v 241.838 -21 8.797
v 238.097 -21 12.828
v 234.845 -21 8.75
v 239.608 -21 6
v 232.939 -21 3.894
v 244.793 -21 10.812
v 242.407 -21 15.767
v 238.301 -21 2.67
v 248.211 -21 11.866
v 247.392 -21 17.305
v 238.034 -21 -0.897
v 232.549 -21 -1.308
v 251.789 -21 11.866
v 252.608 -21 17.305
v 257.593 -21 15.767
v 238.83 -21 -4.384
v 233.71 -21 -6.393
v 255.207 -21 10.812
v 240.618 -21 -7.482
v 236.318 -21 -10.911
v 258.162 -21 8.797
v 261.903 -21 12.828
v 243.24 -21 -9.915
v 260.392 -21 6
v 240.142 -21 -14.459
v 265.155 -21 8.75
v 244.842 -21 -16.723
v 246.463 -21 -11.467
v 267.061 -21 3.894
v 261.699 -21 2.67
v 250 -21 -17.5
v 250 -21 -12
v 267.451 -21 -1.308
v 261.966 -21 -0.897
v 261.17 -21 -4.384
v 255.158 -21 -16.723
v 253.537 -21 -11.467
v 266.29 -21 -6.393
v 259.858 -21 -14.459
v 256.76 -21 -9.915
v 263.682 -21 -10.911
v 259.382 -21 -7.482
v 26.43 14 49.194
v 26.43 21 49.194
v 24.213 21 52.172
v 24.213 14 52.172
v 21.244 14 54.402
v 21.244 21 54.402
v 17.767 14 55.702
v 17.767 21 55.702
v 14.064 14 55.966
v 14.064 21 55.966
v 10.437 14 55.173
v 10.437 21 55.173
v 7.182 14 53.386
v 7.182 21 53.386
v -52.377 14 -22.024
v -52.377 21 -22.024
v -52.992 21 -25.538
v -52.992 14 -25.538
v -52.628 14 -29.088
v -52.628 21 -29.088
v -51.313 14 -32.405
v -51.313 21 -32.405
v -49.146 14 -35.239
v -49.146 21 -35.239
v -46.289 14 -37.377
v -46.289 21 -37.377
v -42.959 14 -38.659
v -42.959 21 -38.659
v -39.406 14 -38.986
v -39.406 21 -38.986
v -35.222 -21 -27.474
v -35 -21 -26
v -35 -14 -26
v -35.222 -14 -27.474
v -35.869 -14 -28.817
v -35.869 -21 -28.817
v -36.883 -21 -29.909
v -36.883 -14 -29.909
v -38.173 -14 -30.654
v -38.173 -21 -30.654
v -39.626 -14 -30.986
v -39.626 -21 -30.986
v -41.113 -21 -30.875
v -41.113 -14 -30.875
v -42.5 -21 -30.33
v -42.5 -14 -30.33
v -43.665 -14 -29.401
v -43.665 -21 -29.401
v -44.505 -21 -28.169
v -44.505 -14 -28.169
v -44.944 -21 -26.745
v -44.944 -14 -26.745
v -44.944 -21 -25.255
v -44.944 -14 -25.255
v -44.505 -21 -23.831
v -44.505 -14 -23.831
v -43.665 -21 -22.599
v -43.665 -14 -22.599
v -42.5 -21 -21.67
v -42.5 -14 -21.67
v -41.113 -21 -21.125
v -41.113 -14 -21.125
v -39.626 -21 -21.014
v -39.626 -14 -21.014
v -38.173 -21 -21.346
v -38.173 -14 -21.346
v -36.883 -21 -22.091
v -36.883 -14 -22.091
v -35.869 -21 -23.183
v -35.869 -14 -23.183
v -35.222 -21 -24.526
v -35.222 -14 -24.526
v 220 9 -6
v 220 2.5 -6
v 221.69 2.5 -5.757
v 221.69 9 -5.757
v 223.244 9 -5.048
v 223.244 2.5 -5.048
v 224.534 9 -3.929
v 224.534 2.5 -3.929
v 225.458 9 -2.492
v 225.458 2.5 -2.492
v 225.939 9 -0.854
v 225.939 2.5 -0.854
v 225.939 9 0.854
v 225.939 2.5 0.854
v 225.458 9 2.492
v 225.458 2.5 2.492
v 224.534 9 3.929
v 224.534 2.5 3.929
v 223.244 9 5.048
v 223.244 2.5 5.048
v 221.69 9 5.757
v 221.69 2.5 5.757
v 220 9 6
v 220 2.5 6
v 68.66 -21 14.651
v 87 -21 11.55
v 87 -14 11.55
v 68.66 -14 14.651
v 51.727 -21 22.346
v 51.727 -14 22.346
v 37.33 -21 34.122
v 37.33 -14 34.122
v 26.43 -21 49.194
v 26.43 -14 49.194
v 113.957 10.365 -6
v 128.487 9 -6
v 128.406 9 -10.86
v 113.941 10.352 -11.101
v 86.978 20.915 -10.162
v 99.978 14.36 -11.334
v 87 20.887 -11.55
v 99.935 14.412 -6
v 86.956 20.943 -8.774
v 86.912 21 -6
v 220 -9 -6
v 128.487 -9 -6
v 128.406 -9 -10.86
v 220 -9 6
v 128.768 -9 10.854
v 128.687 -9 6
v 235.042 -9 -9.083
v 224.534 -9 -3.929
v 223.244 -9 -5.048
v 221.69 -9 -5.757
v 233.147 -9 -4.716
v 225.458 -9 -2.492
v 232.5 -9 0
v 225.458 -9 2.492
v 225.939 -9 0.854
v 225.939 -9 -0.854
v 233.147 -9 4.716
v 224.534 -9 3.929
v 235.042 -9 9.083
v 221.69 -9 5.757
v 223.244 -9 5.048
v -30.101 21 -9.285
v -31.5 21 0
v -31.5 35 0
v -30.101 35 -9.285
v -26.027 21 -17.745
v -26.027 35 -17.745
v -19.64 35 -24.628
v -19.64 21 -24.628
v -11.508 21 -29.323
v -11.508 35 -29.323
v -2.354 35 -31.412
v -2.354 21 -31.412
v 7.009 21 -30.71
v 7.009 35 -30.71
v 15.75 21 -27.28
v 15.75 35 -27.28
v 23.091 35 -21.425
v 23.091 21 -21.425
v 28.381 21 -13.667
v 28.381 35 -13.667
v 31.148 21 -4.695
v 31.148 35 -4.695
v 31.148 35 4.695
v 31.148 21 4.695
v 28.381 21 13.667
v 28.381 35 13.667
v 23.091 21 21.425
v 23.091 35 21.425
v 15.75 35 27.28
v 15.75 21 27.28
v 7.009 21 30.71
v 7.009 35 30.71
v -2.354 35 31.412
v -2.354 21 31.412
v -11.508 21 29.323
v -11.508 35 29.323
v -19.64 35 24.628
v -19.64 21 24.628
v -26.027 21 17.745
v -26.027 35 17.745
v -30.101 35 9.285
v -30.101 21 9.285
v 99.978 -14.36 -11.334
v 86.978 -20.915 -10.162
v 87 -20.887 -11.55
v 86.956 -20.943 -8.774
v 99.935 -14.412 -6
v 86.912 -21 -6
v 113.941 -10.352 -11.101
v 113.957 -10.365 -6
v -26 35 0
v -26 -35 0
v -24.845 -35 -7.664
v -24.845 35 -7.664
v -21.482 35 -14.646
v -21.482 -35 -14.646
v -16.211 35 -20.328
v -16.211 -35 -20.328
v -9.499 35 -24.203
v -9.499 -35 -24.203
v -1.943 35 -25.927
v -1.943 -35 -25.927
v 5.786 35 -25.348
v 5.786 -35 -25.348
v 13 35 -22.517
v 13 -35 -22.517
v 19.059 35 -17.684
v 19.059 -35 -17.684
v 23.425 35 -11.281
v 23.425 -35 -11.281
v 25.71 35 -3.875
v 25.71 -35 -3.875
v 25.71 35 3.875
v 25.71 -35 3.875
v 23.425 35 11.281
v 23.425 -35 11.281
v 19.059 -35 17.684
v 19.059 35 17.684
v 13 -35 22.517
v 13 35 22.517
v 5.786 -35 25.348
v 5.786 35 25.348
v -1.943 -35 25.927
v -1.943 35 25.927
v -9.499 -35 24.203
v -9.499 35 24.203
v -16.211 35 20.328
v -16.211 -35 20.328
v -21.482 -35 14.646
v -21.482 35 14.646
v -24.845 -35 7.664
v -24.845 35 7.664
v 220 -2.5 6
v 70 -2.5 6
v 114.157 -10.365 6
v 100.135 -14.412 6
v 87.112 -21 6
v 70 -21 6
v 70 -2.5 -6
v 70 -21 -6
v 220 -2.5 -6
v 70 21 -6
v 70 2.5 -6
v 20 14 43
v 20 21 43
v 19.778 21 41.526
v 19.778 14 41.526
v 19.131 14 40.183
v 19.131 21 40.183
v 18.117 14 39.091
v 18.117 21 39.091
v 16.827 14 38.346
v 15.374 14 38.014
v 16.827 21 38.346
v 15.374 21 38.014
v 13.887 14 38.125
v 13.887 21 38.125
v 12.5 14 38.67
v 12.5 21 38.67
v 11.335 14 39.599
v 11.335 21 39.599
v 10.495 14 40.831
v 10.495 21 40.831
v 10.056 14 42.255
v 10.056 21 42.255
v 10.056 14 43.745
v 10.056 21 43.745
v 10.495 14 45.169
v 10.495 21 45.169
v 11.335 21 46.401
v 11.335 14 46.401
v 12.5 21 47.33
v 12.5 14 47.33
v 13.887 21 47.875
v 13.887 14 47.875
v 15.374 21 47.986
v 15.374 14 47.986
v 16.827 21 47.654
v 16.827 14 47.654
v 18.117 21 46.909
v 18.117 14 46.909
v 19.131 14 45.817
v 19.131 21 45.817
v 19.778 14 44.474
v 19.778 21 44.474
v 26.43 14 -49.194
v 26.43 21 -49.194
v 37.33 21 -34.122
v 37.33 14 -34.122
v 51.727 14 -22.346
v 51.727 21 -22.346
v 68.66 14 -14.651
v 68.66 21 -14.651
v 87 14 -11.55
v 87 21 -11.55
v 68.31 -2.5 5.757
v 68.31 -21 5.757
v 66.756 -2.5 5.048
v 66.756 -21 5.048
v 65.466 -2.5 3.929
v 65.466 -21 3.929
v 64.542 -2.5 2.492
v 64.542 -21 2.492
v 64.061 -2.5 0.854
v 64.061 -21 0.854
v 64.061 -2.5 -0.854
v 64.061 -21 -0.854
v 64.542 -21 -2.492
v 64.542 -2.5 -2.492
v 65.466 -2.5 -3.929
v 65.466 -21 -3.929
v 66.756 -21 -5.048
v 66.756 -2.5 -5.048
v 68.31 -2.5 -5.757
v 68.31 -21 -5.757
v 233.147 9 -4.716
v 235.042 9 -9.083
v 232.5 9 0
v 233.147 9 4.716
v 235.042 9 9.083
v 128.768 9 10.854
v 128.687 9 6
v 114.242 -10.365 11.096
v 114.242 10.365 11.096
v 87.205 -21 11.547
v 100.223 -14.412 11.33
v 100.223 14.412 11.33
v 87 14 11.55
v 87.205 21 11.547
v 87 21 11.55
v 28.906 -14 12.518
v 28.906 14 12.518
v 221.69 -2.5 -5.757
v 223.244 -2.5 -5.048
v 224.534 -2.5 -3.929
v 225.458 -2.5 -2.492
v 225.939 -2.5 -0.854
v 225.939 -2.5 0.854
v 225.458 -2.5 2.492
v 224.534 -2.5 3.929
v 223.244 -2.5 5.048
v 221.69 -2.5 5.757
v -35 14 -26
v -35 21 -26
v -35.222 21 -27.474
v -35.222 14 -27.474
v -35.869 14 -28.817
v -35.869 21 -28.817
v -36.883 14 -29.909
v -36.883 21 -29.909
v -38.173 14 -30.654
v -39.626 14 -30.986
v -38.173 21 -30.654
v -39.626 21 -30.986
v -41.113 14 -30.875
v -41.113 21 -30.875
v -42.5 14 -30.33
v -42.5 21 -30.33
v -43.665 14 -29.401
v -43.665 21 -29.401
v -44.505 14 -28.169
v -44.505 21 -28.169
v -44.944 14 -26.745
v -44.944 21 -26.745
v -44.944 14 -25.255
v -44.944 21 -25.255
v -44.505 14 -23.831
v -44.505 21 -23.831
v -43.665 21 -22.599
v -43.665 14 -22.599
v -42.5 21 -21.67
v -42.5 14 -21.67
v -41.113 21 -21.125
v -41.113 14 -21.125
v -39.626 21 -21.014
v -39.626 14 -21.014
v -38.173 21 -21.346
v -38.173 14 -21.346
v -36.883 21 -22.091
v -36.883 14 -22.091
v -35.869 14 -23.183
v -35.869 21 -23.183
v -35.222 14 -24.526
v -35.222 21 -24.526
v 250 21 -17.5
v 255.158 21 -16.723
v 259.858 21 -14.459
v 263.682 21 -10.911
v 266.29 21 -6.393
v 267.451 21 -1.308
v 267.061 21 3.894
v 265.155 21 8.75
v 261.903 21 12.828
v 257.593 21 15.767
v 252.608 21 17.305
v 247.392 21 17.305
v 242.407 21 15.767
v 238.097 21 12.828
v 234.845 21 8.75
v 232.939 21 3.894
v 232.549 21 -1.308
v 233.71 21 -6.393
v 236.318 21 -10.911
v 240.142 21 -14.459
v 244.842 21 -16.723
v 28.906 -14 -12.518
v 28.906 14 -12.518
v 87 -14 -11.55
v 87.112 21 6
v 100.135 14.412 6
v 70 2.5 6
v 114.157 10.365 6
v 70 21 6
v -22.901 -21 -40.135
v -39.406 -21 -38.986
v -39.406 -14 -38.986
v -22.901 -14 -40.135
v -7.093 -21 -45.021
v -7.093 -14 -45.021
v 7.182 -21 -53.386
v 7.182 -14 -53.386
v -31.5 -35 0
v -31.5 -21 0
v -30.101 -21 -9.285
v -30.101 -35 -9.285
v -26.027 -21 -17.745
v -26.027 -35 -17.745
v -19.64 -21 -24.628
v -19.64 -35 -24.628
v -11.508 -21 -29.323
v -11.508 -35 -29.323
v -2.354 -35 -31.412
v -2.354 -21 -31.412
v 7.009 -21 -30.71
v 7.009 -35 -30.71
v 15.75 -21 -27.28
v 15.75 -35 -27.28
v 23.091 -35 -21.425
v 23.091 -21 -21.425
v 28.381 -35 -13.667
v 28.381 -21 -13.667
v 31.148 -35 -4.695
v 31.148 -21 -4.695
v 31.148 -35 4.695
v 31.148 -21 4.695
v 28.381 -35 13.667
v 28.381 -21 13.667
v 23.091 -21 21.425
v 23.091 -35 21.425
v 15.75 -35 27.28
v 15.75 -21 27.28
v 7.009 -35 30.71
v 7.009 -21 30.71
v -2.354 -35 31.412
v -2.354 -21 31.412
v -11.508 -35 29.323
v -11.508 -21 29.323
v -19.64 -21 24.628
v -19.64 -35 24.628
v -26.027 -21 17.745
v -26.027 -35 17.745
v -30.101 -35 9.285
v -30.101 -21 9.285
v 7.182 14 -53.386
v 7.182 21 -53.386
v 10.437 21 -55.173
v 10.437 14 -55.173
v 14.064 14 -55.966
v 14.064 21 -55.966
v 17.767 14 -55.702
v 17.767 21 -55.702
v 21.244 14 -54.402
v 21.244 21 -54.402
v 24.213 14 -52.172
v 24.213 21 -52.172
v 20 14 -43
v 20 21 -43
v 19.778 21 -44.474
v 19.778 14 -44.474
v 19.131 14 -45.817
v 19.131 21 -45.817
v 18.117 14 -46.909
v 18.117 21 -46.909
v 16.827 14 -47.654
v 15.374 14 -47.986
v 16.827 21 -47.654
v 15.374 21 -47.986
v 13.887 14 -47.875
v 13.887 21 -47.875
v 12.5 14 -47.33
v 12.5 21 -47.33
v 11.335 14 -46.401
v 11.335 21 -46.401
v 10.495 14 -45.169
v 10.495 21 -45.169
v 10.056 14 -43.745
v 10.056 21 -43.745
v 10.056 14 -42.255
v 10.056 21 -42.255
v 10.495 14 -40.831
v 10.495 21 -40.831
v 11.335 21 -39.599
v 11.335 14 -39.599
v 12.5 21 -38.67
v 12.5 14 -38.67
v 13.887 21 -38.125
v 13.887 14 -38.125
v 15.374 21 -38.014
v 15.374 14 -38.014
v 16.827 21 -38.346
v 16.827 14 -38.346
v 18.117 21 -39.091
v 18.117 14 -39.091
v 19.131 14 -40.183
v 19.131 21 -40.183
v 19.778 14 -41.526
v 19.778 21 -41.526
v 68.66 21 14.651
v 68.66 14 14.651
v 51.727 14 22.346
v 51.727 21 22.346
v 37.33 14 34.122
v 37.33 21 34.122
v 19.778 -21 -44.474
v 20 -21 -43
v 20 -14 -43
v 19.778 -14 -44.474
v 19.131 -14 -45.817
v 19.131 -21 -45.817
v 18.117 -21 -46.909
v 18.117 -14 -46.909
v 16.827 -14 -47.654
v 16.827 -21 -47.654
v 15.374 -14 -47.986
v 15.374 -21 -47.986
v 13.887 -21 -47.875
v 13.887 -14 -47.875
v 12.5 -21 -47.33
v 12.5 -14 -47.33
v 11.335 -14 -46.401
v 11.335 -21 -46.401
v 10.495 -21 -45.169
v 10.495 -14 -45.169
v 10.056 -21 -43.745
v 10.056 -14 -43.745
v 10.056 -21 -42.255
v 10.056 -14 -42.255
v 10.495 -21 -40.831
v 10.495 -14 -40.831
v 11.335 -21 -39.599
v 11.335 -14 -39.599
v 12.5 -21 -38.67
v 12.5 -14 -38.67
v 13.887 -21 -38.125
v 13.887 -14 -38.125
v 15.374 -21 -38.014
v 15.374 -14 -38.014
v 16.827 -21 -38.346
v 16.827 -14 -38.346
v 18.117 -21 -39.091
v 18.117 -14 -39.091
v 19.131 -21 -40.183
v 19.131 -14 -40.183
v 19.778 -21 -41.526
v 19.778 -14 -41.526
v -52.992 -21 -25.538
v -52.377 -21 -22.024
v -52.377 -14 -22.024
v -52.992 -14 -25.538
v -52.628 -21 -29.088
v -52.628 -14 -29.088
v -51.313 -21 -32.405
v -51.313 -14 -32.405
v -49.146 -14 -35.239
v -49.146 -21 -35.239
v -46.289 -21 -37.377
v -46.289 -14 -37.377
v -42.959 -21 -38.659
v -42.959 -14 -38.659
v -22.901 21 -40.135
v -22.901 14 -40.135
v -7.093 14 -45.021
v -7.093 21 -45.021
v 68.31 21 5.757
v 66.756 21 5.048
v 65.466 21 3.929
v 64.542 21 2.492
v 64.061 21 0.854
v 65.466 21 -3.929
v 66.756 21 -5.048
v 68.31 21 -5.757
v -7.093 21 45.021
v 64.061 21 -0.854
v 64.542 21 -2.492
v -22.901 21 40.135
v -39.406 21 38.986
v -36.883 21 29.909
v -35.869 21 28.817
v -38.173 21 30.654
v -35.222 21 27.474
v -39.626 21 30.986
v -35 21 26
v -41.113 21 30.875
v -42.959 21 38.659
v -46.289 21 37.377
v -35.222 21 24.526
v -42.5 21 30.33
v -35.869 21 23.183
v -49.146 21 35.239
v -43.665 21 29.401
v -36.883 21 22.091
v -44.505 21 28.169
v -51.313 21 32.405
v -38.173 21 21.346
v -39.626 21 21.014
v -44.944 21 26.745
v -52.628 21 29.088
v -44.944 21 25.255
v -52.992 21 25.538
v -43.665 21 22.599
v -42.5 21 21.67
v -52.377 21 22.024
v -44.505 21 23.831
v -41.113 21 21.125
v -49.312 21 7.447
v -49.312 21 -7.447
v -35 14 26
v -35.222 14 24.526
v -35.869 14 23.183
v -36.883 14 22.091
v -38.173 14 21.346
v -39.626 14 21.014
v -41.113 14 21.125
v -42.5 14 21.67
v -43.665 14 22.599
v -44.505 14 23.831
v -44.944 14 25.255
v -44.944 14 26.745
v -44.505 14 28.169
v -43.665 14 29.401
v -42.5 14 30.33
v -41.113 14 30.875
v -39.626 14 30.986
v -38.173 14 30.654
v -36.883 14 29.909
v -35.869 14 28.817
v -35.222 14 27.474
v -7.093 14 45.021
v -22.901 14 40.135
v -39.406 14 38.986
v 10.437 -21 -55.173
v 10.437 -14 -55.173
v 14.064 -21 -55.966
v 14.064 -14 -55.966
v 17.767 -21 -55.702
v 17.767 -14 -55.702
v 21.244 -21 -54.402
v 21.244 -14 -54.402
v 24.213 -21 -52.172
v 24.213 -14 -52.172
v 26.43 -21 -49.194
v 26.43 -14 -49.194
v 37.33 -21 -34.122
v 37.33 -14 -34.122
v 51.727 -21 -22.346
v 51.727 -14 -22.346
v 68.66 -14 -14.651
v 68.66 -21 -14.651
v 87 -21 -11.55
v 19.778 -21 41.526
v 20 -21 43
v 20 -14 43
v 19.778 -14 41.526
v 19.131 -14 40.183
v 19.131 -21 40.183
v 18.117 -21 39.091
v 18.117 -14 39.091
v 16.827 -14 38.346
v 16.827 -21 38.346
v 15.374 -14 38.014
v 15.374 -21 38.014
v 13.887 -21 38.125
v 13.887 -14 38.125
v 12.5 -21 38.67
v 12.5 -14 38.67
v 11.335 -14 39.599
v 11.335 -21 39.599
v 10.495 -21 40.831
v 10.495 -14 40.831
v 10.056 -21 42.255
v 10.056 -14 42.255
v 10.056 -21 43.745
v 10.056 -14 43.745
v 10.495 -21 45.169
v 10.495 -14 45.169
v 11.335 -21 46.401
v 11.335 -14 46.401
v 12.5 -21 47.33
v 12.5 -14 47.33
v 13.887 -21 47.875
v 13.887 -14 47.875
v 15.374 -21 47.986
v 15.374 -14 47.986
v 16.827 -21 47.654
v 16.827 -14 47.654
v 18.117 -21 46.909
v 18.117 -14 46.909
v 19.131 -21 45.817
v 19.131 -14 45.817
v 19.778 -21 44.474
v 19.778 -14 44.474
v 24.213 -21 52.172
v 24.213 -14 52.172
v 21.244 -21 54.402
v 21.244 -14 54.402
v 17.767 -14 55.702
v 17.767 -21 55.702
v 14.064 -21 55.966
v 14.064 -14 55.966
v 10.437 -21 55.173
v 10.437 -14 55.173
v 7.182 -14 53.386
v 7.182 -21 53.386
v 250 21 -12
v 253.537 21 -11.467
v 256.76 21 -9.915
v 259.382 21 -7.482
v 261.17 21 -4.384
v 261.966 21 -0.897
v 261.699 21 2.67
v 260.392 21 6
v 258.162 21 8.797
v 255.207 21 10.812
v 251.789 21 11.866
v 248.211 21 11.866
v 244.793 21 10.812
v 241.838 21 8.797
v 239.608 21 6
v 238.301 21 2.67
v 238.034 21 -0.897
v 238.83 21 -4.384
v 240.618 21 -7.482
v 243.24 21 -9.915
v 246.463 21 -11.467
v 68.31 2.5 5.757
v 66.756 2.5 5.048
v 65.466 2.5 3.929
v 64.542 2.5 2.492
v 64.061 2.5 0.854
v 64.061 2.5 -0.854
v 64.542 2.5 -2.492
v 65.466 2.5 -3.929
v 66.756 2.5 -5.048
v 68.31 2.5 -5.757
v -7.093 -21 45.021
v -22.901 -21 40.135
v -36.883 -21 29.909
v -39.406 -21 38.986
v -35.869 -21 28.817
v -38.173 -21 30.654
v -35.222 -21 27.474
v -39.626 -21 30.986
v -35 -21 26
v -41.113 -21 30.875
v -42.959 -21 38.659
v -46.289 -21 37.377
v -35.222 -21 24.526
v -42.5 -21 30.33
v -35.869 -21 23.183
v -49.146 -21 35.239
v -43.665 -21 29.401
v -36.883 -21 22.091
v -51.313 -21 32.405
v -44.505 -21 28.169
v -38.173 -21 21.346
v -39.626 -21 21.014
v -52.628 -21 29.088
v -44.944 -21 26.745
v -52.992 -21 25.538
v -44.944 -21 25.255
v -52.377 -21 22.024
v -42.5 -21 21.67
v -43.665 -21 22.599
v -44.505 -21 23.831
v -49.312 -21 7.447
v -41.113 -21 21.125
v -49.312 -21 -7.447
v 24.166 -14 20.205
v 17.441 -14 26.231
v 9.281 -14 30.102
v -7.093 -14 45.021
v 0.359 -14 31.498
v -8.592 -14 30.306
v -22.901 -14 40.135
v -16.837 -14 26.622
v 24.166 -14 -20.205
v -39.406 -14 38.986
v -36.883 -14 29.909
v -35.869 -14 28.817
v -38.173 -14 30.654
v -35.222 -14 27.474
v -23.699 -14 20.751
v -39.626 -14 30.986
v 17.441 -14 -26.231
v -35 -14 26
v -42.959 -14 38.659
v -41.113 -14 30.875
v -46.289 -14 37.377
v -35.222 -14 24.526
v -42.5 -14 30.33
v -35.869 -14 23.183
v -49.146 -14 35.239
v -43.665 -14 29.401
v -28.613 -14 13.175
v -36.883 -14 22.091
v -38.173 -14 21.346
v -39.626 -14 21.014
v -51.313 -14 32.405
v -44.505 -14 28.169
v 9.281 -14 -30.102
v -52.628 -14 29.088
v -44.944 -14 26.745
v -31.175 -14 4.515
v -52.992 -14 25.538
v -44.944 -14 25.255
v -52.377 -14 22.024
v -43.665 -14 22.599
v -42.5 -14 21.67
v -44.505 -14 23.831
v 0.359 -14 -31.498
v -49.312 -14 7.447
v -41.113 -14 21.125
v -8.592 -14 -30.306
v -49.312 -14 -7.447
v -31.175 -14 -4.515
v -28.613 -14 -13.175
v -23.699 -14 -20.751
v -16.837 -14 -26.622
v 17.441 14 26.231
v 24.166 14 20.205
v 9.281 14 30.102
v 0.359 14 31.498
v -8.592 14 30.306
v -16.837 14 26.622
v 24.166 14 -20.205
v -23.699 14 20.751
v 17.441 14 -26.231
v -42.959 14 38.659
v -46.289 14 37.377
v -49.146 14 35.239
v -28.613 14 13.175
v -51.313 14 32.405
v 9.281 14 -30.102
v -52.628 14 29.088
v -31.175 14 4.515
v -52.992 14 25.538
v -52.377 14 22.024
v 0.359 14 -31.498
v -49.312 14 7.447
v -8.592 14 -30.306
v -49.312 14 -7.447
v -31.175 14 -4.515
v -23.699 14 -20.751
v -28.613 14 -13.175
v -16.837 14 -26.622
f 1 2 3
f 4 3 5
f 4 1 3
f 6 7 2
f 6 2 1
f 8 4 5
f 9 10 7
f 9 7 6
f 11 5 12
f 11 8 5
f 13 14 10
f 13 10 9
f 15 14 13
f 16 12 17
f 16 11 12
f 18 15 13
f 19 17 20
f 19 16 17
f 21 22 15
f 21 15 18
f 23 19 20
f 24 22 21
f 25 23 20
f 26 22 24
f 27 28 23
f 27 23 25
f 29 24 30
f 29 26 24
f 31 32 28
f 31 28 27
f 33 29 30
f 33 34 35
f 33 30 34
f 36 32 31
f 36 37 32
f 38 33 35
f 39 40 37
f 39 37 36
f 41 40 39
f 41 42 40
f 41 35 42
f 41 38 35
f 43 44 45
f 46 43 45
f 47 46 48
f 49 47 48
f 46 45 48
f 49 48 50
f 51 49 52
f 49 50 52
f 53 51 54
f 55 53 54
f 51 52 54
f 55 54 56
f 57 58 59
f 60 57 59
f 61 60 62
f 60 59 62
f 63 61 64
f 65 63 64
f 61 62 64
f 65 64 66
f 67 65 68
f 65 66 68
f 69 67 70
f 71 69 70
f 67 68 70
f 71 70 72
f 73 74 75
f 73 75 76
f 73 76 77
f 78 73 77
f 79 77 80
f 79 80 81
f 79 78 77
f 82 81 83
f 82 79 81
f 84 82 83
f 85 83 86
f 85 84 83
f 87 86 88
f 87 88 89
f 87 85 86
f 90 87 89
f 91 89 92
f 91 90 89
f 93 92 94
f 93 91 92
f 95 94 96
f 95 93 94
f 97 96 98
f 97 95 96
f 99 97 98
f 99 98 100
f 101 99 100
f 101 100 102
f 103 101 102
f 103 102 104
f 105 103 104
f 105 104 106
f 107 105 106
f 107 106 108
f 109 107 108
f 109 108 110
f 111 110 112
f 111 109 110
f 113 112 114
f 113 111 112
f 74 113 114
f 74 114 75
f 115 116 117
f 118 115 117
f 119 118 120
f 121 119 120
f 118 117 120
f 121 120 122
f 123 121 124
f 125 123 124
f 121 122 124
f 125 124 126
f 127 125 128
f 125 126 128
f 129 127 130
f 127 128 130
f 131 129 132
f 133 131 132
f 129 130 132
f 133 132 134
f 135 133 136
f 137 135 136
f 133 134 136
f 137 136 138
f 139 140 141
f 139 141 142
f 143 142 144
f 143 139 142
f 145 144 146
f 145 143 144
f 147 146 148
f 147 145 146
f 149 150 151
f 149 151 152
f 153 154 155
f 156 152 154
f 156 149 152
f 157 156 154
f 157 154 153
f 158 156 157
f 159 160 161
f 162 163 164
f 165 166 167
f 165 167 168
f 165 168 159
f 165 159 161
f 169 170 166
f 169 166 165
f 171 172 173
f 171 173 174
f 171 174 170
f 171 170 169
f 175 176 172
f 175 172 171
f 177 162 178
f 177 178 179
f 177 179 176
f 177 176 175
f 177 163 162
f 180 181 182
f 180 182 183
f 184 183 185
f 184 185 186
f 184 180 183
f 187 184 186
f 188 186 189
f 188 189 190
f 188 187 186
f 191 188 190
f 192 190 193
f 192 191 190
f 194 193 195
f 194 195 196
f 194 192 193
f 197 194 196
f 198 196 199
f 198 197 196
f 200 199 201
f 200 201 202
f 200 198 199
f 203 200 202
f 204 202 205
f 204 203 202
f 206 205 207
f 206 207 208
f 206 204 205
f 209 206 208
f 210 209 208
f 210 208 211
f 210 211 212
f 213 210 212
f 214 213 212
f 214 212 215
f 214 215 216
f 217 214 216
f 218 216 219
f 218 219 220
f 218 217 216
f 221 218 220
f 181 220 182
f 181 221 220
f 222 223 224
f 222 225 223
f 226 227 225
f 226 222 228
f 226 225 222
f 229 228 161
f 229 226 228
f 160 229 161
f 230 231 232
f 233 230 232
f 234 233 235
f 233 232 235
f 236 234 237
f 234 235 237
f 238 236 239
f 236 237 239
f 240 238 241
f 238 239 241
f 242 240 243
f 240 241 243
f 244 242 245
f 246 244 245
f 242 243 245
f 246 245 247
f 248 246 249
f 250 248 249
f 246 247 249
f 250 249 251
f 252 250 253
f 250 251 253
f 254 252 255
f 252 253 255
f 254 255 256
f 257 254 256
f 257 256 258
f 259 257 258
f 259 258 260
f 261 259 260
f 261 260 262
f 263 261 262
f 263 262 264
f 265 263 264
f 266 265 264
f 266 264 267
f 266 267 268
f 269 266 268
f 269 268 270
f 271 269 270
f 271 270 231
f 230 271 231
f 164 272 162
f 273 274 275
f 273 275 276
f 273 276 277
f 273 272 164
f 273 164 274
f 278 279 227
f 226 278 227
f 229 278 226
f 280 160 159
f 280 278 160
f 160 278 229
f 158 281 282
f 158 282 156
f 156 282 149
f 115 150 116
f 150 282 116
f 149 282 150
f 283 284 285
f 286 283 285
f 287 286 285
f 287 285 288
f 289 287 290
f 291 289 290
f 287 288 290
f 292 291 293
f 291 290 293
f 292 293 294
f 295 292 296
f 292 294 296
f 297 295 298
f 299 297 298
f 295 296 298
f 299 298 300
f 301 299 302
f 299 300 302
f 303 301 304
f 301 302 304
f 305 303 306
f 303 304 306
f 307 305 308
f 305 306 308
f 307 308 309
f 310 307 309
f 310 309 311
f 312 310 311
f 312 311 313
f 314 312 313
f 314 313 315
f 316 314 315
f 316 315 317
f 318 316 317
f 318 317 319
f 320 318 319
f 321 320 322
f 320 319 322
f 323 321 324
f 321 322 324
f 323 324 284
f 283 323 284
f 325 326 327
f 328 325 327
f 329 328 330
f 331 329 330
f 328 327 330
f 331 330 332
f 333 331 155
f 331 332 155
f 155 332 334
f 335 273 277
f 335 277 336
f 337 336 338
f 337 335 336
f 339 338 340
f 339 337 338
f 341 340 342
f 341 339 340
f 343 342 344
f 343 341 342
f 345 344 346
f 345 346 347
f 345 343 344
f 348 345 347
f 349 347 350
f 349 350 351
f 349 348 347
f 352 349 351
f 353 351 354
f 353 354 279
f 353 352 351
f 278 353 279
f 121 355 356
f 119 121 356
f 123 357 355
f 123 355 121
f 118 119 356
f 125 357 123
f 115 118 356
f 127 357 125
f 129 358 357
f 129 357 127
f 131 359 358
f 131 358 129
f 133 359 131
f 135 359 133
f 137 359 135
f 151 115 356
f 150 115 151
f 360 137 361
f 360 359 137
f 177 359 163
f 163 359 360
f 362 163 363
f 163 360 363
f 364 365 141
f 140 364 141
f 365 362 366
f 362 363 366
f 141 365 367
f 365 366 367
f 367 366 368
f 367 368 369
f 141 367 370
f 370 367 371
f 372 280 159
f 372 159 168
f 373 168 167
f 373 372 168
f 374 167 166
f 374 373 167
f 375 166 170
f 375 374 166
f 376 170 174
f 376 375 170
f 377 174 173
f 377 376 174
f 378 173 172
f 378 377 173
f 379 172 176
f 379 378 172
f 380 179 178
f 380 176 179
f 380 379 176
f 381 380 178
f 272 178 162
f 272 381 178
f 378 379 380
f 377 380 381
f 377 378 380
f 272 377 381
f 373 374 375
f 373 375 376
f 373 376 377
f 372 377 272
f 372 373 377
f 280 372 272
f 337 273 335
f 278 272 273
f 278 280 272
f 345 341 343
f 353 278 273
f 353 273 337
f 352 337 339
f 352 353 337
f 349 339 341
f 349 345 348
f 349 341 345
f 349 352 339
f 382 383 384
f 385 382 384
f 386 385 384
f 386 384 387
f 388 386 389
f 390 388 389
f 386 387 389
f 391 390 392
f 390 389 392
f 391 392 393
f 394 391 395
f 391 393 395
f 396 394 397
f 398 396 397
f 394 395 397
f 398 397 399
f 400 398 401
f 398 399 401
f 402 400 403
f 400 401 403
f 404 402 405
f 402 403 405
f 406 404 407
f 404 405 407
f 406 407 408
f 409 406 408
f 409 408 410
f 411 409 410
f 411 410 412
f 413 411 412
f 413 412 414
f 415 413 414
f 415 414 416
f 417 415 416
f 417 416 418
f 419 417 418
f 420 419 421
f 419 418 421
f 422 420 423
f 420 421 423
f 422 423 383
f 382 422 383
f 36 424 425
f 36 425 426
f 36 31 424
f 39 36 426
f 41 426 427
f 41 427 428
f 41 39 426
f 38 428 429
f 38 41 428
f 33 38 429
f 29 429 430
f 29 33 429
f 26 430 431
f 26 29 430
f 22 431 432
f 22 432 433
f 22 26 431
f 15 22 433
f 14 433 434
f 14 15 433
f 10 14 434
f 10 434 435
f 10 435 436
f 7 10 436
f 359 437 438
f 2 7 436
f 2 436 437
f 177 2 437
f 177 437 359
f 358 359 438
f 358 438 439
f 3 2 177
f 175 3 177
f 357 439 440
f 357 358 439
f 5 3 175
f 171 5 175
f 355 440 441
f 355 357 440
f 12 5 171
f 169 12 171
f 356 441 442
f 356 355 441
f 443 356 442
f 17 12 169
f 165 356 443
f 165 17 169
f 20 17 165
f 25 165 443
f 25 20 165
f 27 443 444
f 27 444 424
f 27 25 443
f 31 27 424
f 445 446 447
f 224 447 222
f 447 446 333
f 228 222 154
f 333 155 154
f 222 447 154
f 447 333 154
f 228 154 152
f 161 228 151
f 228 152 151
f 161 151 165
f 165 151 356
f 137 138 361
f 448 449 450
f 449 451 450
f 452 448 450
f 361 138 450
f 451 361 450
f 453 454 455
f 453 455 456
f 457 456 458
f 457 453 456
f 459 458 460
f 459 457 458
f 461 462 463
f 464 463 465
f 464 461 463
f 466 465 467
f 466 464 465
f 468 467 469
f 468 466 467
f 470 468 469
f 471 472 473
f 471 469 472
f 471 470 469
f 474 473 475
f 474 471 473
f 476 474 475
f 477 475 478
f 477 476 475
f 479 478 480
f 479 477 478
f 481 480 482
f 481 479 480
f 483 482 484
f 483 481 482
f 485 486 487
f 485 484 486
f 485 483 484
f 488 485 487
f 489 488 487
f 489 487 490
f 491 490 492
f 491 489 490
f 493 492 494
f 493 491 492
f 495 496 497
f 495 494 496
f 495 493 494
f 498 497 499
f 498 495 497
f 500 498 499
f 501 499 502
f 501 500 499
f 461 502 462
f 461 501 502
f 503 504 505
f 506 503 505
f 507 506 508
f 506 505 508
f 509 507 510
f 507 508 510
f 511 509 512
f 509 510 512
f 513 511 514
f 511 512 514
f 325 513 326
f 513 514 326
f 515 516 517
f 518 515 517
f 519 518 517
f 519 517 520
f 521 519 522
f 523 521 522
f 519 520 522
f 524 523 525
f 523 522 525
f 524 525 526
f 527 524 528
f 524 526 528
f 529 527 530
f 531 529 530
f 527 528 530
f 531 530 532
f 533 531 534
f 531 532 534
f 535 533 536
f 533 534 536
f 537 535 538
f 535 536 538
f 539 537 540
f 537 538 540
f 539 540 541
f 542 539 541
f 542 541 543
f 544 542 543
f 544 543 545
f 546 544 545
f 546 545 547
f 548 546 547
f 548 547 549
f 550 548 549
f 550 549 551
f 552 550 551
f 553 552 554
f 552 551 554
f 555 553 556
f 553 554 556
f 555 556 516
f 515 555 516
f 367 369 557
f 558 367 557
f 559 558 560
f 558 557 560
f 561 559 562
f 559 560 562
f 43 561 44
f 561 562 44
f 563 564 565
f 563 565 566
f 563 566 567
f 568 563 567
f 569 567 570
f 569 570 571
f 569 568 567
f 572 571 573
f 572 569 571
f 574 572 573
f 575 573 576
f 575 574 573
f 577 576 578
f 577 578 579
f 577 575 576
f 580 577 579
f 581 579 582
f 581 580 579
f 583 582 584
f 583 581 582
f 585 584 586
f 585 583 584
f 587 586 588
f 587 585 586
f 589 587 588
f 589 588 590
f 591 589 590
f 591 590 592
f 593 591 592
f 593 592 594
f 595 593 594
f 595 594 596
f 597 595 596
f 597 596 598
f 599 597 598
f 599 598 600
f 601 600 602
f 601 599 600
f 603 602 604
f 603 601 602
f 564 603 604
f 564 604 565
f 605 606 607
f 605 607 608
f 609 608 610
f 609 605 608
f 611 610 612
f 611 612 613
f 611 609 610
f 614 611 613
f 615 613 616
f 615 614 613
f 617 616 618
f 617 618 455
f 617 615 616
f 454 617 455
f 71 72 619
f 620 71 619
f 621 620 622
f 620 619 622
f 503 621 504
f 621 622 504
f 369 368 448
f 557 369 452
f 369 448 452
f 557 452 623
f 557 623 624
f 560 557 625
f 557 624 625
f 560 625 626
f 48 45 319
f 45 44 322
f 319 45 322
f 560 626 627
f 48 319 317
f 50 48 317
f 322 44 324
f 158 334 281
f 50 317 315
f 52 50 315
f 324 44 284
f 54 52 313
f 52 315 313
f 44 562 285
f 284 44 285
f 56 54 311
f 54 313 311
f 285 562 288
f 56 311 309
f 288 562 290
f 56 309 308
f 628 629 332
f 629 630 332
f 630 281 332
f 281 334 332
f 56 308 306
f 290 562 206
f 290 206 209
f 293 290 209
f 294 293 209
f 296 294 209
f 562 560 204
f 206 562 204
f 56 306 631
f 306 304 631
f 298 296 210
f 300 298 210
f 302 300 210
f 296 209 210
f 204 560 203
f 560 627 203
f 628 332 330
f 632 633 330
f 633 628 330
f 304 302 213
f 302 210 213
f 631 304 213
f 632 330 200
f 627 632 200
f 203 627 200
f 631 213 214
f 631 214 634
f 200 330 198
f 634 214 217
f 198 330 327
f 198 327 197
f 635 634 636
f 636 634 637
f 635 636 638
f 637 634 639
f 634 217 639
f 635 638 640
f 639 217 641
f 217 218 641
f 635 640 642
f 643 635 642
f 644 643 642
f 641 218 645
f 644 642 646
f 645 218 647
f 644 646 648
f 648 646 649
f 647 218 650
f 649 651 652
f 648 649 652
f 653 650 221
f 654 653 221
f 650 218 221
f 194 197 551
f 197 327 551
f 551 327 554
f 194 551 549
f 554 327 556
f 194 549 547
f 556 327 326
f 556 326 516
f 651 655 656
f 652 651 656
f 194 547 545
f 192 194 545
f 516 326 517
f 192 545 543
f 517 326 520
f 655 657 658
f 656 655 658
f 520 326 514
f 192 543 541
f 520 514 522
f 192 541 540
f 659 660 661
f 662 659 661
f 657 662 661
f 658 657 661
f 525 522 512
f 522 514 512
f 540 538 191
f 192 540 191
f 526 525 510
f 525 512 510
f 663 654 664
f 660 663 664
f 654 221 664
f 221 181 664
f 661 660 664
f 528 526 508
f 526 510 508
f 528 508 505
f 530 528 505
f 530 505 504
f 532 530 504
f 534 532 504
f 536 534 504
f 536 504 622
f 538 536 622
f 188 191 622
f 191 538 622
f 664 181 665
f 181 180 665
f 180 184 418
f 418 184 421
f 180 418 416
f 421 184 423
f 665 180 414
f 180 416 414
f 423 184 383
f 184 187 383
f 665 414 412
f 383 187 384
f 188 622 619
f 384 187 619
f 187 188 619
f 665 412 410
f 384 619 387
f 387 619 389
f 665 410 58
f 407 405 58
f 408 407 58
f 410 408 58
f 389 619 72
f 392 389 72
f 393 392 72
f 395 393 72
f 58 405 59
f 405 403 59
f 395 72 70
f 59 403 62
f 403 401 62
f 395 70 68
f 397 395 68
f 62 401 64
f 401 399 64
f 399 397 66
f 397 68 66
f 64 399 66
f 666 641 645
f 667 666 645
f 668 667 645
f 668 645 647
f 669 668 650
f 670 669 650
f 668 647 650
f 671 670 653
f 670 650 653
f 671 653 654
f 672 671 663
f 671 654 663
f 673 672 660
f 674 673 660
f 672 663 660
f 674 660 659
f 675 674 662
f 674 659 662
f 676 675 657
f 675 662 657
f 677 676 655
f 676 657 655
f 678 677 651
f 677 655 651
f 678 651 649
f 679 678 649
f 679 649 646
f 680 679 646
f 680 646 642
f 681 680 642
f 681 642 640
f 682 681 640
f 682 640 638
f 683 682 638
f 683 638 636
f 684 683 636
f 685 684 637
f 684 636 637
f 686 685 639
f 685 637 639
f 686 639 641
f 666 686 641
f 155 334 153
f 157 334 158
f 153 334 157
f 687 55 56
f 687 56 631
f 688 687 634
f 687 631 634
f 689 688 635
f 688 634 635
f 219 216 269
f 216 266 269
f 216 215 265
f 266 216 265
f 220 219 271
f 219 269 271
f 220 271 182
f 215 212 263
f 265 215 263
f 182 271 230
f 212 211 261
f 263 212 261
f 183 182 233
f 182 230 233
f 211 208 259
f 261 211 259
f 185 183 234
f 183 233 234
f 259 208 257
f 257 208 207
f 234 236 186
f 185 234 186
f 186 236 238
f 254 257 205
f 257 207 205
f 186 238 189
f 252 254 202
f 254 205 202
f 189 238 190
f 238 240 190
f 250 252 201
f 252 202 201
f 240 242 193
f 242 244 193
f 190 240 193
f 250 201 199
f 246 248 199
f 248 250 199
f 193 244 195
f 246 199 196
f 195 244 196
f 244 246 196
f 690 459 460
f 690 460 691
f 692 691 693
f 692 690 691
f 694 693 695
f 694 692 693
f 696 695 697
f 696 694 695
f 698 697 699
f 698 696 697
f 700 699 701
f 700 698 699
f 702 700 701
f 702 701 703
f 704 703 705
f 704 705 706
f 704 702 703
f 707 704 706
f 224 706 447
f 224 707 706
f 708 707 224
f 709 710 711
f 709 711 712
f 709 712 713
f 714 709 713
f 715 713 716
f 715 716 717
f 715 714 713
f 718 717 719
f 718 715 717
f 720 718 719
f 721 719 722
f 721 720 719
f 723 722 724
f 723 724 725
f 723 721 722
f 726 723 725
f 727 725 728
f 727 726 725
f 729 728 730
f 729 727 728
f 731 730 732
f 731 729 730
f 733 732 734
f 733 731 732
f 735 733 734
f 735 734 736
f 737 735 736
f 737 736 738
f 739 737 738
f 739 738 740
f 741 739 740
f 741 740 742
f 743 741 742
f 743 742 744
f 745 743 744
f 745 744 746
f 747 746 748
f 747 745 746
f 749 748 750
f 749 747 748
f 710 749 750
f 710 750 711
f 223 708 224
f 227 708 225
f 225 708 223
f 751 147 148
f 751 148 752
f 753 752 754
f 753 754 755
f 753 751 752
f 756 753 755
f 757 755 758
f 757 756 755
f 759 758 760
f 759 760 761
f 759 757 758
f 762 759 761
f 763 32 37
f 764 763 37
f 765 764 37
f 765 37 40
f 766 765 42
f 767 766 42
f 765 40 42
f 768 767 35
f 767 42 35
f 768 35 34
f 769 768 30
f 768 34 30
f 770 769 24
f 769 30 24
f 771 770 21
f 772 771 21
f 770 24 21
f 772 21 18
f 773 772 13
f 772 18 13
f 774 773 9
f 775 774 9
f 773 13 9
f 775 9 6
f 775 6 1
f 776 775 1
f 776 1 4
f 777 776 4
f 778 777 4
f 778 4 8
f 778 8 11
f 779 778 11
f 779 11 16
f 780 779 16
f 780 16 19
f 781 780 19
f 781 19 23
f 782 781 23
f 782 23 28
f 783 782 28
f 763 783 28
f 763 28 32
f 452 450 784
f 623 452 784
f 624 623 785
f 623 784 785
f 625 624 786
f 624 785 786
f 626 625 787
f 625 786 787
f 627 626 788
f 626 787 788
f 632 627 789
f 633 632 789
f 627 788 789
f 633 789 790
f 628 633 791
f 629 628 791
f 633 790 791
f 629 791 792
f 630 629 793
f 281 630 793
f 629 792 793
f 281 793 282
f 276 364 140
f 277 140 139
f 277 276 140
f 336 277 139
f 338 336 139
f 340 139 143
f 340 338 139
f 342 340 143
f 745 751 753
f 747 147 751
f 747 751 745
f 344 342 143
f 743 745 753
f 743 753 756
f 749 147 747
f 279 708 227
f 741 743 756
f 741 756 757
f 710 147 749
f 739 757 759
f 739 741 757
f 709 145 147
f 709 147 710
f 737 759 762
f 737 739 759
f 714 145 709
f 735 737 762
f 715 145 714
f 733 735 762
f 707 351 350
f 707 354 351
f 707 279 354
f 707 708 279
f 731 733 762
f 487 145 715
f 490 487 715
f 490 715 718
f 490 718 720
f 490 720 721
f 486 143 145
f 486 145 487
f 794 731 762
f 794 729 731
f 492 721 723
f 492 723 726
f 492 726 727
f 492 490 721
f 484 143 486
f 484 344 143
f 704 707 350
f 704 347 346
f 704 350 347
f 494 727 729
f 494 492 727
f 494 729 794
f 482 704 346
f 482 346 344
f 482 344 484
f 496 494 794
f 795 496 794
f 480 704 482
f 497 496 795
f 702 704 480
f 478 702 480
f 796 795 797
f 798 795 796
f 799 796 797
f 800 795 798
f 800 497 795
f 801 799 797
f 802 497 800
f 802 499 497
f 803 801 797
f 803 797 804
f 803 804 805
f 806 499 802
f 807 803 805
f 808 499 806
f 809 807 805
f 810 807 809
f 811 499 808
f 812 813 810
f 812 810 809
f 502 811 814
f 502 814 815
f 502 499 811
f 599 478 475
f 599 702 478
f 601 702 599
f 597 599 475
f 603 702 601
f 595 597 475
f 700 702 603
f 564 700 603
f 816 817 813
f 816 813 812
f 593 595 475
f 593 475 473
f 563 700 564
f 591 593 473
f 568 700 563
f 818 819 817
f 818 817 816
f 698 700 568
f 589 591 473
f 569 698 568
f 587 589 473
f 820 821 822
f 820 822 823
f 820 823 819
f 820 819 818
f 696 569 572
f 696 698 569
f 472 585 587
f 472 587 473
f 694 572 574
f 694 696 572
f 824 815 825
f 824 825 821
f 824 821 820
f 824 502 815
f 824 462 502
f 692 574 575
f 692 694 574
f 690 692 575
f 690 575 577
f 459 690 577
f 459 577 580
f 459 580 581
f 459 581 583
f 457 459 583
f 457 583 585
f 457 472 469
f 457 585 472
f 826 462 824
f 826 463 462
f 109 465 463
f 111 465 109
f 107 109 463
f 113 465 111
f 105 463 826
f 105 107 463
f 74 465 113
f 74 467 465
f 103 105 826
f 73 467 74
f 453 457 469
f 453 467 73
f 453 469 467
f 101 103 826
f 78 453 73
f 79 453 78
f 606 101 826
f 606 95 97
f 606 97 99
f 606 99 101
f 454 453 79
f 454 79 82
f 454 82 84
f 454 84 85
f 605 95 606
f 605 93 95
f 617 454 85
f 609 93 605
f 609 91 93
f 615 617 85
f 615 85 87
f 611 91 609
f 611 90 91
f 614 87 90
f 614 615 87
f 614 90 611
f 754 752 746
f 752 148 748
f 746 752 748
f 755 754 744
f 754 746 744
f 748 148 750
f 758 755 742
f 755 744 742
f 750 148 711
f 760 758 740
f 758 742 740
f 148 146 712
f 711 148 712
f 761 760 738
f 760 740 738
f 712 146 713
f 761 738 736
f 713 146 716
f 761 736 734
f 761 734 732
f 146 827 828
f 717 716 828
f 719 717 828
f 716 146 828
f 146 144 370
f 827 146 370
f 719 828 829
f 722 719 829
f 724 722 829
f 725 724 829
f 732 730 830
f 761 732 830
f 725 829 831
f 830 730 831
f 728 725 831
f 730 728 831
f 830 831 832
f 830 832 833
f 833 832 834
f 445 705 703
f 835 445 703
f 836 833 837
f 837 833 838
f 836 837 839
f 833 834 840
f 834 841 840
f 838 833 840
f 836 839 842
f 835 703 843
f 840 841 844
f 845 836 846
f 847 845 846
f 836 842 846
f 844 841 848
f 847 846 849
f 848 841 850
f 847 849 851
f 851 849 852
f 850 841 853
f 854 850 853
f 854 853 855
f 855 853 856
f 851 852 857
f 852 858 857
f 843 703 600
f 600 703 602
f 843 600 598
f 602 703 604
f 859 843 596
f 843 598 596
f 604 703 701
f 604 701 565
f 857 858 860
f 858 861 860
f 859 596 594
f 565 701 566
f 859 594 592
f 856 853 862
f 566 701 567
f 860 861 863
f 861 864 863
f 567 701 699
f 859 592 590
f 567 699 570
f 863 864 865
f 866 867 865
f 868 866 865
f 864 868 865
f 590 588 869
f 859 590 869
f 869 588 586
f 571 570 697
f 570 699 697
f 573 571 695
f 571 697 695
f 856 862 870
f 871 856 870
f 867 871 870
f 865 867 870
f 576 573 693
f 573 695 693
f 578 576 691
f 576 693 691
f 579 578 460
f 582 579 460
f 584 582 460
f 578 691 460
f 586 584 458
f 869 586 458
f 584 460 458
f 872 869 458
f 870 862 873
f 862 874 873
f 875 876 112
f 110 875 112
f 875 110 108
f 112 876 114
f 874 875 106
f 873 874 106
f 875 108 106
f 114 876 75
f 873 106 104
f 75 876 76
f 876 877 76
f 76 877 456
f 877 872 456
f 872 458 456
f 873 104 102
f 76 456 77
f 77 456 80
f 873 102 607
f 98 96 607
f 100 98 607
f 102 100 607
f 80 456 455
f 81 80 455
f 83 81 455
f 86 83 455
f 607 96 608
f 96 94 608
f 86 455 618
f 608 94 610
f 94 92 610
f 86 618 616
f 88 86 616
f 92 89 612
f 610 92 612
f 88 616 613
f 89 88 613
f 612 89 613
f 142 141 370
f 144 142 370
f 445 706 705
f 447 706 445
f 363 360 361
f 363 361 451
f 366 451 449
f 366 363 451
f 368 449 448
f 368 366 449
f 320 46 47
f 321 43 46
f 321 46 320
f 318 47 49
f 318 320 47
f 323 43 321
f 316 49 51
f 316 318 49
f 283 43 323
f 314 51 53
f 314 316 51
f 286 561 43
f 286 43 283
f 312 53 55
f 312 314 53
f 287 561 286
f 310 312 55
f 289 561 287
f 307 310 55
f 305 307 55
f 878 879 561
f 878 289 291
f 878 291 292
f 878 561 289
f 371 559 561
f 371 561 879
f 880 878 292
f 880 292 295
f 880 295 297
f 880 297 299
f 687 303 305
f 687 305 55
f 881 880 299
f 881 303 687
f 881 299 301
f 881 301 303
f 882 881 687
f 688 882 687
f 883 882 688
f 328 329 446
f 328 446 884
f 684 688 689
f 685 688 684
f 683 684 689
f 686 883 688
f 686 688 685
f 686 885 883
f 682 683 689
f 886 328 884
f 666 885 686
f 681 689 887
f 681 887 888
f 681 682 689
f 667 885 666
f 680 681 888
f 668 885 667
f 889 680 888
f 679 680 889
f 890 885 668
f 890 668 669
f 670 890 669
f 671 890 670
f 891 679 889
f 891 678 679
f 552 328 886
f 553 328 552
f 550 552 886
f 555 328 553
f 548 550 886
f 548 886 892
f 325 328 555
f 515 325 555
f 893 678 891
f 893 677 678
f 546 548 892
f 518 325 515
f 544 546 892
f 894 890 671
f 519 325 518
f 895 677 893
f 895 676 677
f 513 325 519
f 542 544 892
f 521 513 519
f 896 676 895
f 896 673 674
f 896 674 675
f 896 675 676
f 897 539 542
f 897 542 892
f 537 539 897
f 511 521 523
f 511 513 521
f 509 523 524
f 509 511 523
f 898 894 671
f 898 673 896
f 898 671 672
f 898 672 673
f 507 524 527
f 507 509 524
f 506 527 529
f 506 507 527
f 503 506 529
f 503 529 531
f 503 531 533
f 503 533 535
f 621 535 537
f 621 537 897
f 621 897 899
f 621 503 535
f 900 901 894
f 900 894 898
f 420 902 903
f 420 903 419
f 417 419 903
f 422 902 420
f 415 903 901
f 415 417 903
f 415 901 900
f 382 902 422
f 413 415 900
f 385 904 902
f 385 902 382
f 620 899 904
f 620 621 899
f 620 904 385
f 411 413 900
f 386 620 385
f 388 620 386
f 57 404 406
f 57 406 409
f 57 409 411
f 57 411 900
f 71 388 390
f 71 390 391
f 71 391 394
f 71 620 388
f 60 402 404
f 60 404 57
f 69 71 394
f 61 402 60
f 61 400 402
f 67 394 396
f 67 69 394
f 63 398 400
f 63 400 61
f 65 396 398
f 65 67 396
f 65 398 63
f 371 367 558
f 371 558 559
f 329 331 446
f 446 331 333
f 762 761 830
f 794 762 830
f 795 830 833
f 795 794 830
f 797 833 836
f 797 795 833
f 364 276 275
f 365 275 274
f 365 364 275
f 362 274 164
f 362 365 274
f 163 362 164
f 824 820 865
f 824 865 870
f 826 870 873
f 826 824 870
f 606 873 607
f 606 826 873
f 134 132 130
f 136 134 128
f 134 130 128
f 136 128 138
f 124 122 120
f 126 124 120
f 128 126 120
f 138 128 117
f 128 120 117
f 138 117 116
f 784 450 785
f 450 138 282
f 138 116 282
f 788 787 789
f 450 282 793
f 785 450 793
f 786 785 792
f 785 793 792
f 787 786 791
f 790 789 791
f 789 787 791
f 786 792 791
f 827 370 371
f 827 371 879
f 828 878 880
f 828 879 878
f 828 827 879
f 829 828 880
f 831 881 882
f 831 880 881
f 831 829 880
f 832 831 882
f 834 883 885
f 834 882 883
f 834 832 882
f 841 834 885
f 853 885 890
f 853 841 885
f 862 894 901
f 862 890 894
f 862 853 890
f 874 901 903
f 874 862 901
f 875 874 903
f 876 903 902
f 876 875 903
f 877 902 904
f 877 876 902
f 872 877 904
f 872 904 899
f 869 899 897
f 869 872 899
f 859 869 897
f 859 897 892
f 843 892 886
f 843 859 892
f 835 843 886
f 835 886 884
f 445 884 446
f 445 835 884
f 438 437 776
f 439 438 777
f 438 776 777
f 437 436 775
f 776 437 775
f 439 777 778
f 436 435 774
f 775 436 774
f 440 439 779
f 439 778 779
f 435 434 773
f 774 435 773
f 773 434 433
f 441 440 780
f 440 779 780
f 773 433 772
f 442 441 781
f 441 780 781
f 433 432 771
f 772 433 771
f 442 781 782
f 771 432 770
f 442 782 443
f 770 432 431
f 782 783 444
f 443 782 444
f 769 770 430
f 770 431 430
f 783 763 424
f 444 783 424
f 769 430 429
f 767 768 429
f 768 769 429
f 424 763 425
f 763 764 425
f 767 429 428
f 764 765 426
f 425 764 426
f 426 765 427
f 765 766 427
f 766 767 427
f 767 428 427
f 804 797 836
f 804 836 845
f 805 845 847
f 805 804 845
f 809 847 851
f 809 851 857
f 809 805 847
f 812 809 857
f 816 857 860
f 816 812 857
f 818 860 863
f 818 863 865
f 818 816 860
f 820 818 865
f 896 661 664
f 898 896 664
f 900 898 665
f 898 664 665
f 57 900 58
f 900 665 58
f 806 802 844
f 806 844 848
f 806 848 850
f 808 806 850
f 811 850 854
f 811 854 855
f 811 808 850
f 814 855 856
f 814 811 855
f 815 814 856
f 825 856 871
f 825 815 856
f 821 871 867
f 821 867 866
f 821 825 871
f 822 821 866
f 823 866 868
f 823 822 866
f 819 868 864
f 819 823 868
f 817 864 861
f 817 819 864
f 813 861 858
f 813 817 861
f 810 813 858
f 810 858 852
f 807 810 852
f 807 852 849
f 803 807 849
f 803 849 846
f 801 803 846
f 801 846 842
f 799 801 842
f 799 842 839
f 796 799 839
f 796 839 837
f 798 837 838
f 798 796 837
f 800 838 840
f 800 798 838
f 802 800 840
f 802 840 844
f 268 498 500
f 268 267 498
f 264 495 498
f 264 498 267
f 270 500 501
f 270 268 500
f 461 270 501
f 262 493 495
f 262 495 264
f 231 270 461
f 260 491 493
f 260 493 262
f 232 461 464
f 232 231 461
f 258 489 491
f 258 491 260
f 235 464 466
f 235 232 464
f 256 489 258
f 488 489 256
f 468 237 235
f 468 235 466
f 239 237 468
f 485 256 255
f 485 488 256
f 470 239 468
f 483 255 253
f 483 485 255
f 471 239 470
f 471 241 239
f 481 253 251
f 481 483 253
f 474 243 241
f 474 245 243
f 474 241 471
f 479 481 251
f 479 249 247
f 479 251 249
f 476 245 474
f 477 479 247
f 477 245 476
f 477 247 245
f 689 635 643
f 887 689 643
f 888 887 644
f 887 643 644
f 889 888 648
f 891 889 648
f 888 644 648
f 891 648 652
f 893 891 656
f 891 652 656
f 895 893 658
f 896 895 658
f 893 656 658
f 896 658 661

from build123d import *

# Parameters (mm, degrees)
SWEEP2_PROFILE_R     = 31.5
BOSS_EXTRUDE2_DEPTH  = 21
CUT_EXTRUDE4_REACH   = 47.019
SWEEP4_PROFILE_R     = 17.5
CUT_EXTRUDE5_START   = 2.5
CUT_EXTRUDE5_DEPTH   = 18.5
BOSS_EXTRUDE5_START  = 21
SKETCH47_R           = 5
BOSS_EXTRUDE5_DEPTH  = 7
BOSS_EXTRUDE6_START  = -21
SKETCH47_3_R         = 5
BOSS_EXTRUDE6_DEPTH  = 7
CUT_SWEEP1_PROFILE_R = 26
CUT_SWEEP2_PROFILE_R = 12


with BuildPart() as part:
    # Sweep2: sweep along a path in Sketch1
    with BuildLine(Plane.XY) as sweep2_path:
        Line((0, 35), (0, -35))
    # Sweep2 profile (on start of the path) → Sweep2 (sweep)
    with BuildSketch(Plane(origin=(0, 35, 0), x_dir=(-1, 0, 0), z_dir=(0, -1, 0))):
        Circle(SWEEP2_PROFILE_R)
    sweep(path=sweep2_path.line)

    # Sketch22 → Boss-Extrude2 (add, symmetric)
    with BuildSketch(Plane(origin=(0, 0, 0), x_dir=(1, 0, 0), z_dir=(0, 1, 0))):
        Polygon((0, 13), (240, 9), (240, -9), (0, -13), align=None)
    extrude(amount=BOSS_EXTRUDE2_DEPTH, both=True)

    # Sketch34 → Cut-Extrude4 (cut, up to next)
    with BuildSketch(Plane(origin=(0.216606498, 0, 12.996389892), x_dir=(0.99986114, 0, -0.016664352), z_dir=(0.016664352, 0, 0.99986114)), mode=Mode.PRIVATE) as cut_extrude4_sk1:
        with BuildLine():
            Line((87, 21), (243, 21))
            Line((243, 21), (243, 9))
            Line((243, 9), (128.569219382, 9))
            ThreePointArc((128.569219382, 9), (106.935911729, 12.060024019), (87, 21))
        make_face()
    cut_extrude4_tool1 = extrude(cut_extrude4_sk1.sketch, amount=-CUT_EXTRUDE4_REACH, mode=Mode.PRIVATE) & part.part
    add(cut_extrude4_tool1.solids().sort_by_distance((171.561444, 15.230505, 10.140643))[0], mode=Mode.SUBTRACT)
    # Sketch34 → Cut-Extrude4 (cut, up to next)
    with BuildSketch(Plane(origin=(0.216606498, 0, 12.996389892), x_dir=(0.99986114, 0, -0.016664352), z_dir=(0.016664352, 0, 0.99986114)), mode=Mode.PRIVATE) as cut_extrude4_sk2:
        with BuildLine():
            Line((128.569219382, -9), (243, -9))
            Line((243, -9), (243, -21))
            Line((243, -21), (87, -21))
            ThreePointArc((87, -21), (106.935911729, -12.060024019), (128.569219382, -9))
        make_face()
    cut_extrude4_tool2 = extrude(cut_extrude4_sk2.sketch, amount=-CUT_EXTRUDE4_REACH, mode=Mode.PRIVATE) & part.part
    add(cut_extrude4_tool2.solids().sort_by_distance((171.561444, -15.230505, 10.140643))[0], mode=Mode.SUBTRACT)

    # Sweep4: sweep along a path in Sketch35
    with BuildLine(Plane.XY) as sweep4_path:
        Line((250, 21), (250, -21))
    # Sweep4 profile (on start of the path) → Sweep4 (sweep)
    with BuildSketch(Plane(origin=(250, 21, 0), x_dir=(0, 0, -1), z_dir=(0, -1, 0))):
        Circle(SWEEP4_PROFILE_R)
    sweep(path=sweep4_path.line)

    # Sketch43 → Cut-Extrude5 (cut)
    with BuildSketch(Plane(origin=(0, 0, 0), x_dir=(1, 0, 0), z_dir=(0, 1, 0)).offset(CUT_EXTRUDE5_START)):
        with BuildLine():
            Line((70, 6), (220, 6))
            ThreePointArc((220, 6), (226, 0), (220, -6))
            Line((220, -6), (70, -6))
            ThreePointArc((70, -6), (64, 0), (70, 6))
        make_face()
    cut_extrude5 = extrude(amount=CUT_EXTRUDE5_DEPTH, mode=Mode.SUBTRACT)

    # Mirror2: Cut-Extrude5 across plane
    add(cut_extrude5.mirror(Plane.ZX), mode=Mode.SUBTRACT)

    # Sketch47 → Boss-Extrude5 (add)
    with BuildSketch(Plane(origin=(0, 0, 0), x_dir=(1, 0, 0), z_dir=(0, 1, 0)).offset(BOSS_EXTRUDE5_START)):
        with BuildLine():
            Line((87, -6), (87, -11.55))
            ThreePointArc((87, -11.55), (51.726774535, -22.345969003), (26.429629343, -49.193833472))
            ThreePointArc((26.429629343, -49.193833472), (17.766830002, -55.702151461), (7.181946677, -53.386435492))
            ThreePointArc((7.181946677, -53.386435492), (-14.855989459, -42.122318837), (-39.406288617, -38.986435492))
            ThreePointArc((-39.406288617, -38.986435492), (-50.326951915, -33.896458963), (-52.376901133, -22.023529412))
            ThreePointArc((-52.376901133, -22.023529412), (-48.925892025, 0), (-52.376901133, 22.023529412))
            ThreePointArc((-52.376901133, 22.023529412), (-50.326951915, 33.896458963), (-39.406288617, 38.986435492))
            ThreePointArc((-39.406288617, 38.986435492), (-14.855989459, 42.122318837), (7.181946677, 53.386435492))
            ThreePointArc((7.181946677, 53.386435492), (17.766830002, 55.702151461), (26.429629343, 49.193833472))
            ThreePointArc((26.429629343, 49.193833472), (51.726774535, 22.345969003), (87, 11.55))
            Line((87, 11.55), (86.912082494, 6))
            Line((86.912082494, 6), (70, 6))
            ThreePointArc((70, 6), (64, 0), (70, -6))
            Line((70, -6), (87, -6))
        make_face()
        with Locations((15, 43)):
            Circle(SKETCH47_R, mode=Mode.SUBTRACT)
        with Locations((-40, 26)):
            Circle(SKETCH47_R, mode=Mode.SUBTRACT)
        with Locations((-40, -26)):
            Circle(SKETCH47_R, mode=Mode.SUBTRACT)
        with Locations((15, -43)):
            Circle(SKETCH47_R, mode=Mode.SUBTRACT)
    extrude(amount=-BOSS_EXTRUDE5_DEPTH)

    # Sketch47<3> → Boss-Extrude6 (add)
    with BuildSketch(Plane(origin=(0, 0, 0), x_dir=(1, 0, 0), z_dir=(0, 1, 0)).offset(BOSS_EXTRUDE6_START)):
        with BuildLine():
            Line((87, -6), (87, -11.55))
            ThreePointArc((87, -11.55), (51.726774535, -22.345969003), (26.429629343, -49.193833472))
            ThreePointArc((26.429629343, -49.193833472), (17.766830002, -55.702151461), (7.181946677, -53.386435492))
            ThreePointArc((7.181946677, -53.386435492), (-14.855989459, -42.122318837), (-39.406288617, -38.986435492))
            ThreePointArc((-39.406288617, -38.986435492), (-50.326951915, -33.896458963), (-52.376901133, -22.023529412))
            ThreePointArc((-52.376901133, -22.023529412), (-48.925892025, 0), (-52.376901133, 22.023529412))
            ThreePointArc((-52.376901133, 22.023529412), (-50.326951915, 33.896458963), (-39.406288617, 38.986435492))
            ThreePointArc((-39.406288617, 38.986435492), (-14.855989459, 42.122318837), (7.181946677, 53.386435492))
            ThreePointArc((7.181946677, 53.386435492), (17.766830002, 55.702151461), (26.429629343, 49.193833472))
            ThreePointArc((26.429629343, 49.193833472), (51.726774535, 22.345969003), (87, 11.55))
            Line((87, 11.55), (86.912082494, 6))
            Line((86.912082494, 6), (70, 6))
            ThreePointArc((70, 6), (64, 0), (70, -6))
            Line((70, -6), (87, -6))
        make_face()
        with Locations((15, 43)):
            Circle(SKETCH47_3_R, mode=Mode.SUBTRACT)
        with Locations((-40, 26)):
            Circle(SKETCH47_3_R, mode=Mode.SUBTRACT)
        with Locations((-40, -26)):
            Circle(SKETCH47_3_R, mode=Mode.SUBTRACT)
        with Locations((15, -43)):
            Circle(SKETCH47_3_R, mode=Mode.SUBTRACT)
    extrude(amount=BOSS_EXTRUDE6_DEPTH)

    # Cut-Sweep1: sweep along a path in Sketch1<4>
    with BuildLine(Plane.XY) as cut_sweep1_path:
        Line((0, 35), (0, -35))
    # Cut-Sweep1 profile (on start of the path) → Cut-Sweep1 (sweep, cut)
    with BuildSketch(Plane(origin=(0, 35, 0), x_dir=(-1, 0, 0), z_dir=(0, -1, 0))):
        Circle(CUT_SWEEP1_PROFILE_R)
    sweep(path=cut_sweep1_path.line, mode=Mode.SUBTRACT)

    # Cut-Sweep2: sweep along a path in Sketch35<2>
    with BuildLine(Plane.XY) as cut_sweep2_path:
        Line((250, 21), (250, -21))
    # Cut-Sweep2 profile (on start of the path) → Cut-Sweep2 (sweep, cut)
    with BuildSketch(Plane(origin=(250, 21, 0), x_dir=(0, 0, -1), z_dir=(0, -1, 0))):
        Circle(CUT_SWEEP2_PROFILE_R)
    sweep(path=cut_sweep2_path.line, mode=Mode.SUBTRACT)


solid = part.part
